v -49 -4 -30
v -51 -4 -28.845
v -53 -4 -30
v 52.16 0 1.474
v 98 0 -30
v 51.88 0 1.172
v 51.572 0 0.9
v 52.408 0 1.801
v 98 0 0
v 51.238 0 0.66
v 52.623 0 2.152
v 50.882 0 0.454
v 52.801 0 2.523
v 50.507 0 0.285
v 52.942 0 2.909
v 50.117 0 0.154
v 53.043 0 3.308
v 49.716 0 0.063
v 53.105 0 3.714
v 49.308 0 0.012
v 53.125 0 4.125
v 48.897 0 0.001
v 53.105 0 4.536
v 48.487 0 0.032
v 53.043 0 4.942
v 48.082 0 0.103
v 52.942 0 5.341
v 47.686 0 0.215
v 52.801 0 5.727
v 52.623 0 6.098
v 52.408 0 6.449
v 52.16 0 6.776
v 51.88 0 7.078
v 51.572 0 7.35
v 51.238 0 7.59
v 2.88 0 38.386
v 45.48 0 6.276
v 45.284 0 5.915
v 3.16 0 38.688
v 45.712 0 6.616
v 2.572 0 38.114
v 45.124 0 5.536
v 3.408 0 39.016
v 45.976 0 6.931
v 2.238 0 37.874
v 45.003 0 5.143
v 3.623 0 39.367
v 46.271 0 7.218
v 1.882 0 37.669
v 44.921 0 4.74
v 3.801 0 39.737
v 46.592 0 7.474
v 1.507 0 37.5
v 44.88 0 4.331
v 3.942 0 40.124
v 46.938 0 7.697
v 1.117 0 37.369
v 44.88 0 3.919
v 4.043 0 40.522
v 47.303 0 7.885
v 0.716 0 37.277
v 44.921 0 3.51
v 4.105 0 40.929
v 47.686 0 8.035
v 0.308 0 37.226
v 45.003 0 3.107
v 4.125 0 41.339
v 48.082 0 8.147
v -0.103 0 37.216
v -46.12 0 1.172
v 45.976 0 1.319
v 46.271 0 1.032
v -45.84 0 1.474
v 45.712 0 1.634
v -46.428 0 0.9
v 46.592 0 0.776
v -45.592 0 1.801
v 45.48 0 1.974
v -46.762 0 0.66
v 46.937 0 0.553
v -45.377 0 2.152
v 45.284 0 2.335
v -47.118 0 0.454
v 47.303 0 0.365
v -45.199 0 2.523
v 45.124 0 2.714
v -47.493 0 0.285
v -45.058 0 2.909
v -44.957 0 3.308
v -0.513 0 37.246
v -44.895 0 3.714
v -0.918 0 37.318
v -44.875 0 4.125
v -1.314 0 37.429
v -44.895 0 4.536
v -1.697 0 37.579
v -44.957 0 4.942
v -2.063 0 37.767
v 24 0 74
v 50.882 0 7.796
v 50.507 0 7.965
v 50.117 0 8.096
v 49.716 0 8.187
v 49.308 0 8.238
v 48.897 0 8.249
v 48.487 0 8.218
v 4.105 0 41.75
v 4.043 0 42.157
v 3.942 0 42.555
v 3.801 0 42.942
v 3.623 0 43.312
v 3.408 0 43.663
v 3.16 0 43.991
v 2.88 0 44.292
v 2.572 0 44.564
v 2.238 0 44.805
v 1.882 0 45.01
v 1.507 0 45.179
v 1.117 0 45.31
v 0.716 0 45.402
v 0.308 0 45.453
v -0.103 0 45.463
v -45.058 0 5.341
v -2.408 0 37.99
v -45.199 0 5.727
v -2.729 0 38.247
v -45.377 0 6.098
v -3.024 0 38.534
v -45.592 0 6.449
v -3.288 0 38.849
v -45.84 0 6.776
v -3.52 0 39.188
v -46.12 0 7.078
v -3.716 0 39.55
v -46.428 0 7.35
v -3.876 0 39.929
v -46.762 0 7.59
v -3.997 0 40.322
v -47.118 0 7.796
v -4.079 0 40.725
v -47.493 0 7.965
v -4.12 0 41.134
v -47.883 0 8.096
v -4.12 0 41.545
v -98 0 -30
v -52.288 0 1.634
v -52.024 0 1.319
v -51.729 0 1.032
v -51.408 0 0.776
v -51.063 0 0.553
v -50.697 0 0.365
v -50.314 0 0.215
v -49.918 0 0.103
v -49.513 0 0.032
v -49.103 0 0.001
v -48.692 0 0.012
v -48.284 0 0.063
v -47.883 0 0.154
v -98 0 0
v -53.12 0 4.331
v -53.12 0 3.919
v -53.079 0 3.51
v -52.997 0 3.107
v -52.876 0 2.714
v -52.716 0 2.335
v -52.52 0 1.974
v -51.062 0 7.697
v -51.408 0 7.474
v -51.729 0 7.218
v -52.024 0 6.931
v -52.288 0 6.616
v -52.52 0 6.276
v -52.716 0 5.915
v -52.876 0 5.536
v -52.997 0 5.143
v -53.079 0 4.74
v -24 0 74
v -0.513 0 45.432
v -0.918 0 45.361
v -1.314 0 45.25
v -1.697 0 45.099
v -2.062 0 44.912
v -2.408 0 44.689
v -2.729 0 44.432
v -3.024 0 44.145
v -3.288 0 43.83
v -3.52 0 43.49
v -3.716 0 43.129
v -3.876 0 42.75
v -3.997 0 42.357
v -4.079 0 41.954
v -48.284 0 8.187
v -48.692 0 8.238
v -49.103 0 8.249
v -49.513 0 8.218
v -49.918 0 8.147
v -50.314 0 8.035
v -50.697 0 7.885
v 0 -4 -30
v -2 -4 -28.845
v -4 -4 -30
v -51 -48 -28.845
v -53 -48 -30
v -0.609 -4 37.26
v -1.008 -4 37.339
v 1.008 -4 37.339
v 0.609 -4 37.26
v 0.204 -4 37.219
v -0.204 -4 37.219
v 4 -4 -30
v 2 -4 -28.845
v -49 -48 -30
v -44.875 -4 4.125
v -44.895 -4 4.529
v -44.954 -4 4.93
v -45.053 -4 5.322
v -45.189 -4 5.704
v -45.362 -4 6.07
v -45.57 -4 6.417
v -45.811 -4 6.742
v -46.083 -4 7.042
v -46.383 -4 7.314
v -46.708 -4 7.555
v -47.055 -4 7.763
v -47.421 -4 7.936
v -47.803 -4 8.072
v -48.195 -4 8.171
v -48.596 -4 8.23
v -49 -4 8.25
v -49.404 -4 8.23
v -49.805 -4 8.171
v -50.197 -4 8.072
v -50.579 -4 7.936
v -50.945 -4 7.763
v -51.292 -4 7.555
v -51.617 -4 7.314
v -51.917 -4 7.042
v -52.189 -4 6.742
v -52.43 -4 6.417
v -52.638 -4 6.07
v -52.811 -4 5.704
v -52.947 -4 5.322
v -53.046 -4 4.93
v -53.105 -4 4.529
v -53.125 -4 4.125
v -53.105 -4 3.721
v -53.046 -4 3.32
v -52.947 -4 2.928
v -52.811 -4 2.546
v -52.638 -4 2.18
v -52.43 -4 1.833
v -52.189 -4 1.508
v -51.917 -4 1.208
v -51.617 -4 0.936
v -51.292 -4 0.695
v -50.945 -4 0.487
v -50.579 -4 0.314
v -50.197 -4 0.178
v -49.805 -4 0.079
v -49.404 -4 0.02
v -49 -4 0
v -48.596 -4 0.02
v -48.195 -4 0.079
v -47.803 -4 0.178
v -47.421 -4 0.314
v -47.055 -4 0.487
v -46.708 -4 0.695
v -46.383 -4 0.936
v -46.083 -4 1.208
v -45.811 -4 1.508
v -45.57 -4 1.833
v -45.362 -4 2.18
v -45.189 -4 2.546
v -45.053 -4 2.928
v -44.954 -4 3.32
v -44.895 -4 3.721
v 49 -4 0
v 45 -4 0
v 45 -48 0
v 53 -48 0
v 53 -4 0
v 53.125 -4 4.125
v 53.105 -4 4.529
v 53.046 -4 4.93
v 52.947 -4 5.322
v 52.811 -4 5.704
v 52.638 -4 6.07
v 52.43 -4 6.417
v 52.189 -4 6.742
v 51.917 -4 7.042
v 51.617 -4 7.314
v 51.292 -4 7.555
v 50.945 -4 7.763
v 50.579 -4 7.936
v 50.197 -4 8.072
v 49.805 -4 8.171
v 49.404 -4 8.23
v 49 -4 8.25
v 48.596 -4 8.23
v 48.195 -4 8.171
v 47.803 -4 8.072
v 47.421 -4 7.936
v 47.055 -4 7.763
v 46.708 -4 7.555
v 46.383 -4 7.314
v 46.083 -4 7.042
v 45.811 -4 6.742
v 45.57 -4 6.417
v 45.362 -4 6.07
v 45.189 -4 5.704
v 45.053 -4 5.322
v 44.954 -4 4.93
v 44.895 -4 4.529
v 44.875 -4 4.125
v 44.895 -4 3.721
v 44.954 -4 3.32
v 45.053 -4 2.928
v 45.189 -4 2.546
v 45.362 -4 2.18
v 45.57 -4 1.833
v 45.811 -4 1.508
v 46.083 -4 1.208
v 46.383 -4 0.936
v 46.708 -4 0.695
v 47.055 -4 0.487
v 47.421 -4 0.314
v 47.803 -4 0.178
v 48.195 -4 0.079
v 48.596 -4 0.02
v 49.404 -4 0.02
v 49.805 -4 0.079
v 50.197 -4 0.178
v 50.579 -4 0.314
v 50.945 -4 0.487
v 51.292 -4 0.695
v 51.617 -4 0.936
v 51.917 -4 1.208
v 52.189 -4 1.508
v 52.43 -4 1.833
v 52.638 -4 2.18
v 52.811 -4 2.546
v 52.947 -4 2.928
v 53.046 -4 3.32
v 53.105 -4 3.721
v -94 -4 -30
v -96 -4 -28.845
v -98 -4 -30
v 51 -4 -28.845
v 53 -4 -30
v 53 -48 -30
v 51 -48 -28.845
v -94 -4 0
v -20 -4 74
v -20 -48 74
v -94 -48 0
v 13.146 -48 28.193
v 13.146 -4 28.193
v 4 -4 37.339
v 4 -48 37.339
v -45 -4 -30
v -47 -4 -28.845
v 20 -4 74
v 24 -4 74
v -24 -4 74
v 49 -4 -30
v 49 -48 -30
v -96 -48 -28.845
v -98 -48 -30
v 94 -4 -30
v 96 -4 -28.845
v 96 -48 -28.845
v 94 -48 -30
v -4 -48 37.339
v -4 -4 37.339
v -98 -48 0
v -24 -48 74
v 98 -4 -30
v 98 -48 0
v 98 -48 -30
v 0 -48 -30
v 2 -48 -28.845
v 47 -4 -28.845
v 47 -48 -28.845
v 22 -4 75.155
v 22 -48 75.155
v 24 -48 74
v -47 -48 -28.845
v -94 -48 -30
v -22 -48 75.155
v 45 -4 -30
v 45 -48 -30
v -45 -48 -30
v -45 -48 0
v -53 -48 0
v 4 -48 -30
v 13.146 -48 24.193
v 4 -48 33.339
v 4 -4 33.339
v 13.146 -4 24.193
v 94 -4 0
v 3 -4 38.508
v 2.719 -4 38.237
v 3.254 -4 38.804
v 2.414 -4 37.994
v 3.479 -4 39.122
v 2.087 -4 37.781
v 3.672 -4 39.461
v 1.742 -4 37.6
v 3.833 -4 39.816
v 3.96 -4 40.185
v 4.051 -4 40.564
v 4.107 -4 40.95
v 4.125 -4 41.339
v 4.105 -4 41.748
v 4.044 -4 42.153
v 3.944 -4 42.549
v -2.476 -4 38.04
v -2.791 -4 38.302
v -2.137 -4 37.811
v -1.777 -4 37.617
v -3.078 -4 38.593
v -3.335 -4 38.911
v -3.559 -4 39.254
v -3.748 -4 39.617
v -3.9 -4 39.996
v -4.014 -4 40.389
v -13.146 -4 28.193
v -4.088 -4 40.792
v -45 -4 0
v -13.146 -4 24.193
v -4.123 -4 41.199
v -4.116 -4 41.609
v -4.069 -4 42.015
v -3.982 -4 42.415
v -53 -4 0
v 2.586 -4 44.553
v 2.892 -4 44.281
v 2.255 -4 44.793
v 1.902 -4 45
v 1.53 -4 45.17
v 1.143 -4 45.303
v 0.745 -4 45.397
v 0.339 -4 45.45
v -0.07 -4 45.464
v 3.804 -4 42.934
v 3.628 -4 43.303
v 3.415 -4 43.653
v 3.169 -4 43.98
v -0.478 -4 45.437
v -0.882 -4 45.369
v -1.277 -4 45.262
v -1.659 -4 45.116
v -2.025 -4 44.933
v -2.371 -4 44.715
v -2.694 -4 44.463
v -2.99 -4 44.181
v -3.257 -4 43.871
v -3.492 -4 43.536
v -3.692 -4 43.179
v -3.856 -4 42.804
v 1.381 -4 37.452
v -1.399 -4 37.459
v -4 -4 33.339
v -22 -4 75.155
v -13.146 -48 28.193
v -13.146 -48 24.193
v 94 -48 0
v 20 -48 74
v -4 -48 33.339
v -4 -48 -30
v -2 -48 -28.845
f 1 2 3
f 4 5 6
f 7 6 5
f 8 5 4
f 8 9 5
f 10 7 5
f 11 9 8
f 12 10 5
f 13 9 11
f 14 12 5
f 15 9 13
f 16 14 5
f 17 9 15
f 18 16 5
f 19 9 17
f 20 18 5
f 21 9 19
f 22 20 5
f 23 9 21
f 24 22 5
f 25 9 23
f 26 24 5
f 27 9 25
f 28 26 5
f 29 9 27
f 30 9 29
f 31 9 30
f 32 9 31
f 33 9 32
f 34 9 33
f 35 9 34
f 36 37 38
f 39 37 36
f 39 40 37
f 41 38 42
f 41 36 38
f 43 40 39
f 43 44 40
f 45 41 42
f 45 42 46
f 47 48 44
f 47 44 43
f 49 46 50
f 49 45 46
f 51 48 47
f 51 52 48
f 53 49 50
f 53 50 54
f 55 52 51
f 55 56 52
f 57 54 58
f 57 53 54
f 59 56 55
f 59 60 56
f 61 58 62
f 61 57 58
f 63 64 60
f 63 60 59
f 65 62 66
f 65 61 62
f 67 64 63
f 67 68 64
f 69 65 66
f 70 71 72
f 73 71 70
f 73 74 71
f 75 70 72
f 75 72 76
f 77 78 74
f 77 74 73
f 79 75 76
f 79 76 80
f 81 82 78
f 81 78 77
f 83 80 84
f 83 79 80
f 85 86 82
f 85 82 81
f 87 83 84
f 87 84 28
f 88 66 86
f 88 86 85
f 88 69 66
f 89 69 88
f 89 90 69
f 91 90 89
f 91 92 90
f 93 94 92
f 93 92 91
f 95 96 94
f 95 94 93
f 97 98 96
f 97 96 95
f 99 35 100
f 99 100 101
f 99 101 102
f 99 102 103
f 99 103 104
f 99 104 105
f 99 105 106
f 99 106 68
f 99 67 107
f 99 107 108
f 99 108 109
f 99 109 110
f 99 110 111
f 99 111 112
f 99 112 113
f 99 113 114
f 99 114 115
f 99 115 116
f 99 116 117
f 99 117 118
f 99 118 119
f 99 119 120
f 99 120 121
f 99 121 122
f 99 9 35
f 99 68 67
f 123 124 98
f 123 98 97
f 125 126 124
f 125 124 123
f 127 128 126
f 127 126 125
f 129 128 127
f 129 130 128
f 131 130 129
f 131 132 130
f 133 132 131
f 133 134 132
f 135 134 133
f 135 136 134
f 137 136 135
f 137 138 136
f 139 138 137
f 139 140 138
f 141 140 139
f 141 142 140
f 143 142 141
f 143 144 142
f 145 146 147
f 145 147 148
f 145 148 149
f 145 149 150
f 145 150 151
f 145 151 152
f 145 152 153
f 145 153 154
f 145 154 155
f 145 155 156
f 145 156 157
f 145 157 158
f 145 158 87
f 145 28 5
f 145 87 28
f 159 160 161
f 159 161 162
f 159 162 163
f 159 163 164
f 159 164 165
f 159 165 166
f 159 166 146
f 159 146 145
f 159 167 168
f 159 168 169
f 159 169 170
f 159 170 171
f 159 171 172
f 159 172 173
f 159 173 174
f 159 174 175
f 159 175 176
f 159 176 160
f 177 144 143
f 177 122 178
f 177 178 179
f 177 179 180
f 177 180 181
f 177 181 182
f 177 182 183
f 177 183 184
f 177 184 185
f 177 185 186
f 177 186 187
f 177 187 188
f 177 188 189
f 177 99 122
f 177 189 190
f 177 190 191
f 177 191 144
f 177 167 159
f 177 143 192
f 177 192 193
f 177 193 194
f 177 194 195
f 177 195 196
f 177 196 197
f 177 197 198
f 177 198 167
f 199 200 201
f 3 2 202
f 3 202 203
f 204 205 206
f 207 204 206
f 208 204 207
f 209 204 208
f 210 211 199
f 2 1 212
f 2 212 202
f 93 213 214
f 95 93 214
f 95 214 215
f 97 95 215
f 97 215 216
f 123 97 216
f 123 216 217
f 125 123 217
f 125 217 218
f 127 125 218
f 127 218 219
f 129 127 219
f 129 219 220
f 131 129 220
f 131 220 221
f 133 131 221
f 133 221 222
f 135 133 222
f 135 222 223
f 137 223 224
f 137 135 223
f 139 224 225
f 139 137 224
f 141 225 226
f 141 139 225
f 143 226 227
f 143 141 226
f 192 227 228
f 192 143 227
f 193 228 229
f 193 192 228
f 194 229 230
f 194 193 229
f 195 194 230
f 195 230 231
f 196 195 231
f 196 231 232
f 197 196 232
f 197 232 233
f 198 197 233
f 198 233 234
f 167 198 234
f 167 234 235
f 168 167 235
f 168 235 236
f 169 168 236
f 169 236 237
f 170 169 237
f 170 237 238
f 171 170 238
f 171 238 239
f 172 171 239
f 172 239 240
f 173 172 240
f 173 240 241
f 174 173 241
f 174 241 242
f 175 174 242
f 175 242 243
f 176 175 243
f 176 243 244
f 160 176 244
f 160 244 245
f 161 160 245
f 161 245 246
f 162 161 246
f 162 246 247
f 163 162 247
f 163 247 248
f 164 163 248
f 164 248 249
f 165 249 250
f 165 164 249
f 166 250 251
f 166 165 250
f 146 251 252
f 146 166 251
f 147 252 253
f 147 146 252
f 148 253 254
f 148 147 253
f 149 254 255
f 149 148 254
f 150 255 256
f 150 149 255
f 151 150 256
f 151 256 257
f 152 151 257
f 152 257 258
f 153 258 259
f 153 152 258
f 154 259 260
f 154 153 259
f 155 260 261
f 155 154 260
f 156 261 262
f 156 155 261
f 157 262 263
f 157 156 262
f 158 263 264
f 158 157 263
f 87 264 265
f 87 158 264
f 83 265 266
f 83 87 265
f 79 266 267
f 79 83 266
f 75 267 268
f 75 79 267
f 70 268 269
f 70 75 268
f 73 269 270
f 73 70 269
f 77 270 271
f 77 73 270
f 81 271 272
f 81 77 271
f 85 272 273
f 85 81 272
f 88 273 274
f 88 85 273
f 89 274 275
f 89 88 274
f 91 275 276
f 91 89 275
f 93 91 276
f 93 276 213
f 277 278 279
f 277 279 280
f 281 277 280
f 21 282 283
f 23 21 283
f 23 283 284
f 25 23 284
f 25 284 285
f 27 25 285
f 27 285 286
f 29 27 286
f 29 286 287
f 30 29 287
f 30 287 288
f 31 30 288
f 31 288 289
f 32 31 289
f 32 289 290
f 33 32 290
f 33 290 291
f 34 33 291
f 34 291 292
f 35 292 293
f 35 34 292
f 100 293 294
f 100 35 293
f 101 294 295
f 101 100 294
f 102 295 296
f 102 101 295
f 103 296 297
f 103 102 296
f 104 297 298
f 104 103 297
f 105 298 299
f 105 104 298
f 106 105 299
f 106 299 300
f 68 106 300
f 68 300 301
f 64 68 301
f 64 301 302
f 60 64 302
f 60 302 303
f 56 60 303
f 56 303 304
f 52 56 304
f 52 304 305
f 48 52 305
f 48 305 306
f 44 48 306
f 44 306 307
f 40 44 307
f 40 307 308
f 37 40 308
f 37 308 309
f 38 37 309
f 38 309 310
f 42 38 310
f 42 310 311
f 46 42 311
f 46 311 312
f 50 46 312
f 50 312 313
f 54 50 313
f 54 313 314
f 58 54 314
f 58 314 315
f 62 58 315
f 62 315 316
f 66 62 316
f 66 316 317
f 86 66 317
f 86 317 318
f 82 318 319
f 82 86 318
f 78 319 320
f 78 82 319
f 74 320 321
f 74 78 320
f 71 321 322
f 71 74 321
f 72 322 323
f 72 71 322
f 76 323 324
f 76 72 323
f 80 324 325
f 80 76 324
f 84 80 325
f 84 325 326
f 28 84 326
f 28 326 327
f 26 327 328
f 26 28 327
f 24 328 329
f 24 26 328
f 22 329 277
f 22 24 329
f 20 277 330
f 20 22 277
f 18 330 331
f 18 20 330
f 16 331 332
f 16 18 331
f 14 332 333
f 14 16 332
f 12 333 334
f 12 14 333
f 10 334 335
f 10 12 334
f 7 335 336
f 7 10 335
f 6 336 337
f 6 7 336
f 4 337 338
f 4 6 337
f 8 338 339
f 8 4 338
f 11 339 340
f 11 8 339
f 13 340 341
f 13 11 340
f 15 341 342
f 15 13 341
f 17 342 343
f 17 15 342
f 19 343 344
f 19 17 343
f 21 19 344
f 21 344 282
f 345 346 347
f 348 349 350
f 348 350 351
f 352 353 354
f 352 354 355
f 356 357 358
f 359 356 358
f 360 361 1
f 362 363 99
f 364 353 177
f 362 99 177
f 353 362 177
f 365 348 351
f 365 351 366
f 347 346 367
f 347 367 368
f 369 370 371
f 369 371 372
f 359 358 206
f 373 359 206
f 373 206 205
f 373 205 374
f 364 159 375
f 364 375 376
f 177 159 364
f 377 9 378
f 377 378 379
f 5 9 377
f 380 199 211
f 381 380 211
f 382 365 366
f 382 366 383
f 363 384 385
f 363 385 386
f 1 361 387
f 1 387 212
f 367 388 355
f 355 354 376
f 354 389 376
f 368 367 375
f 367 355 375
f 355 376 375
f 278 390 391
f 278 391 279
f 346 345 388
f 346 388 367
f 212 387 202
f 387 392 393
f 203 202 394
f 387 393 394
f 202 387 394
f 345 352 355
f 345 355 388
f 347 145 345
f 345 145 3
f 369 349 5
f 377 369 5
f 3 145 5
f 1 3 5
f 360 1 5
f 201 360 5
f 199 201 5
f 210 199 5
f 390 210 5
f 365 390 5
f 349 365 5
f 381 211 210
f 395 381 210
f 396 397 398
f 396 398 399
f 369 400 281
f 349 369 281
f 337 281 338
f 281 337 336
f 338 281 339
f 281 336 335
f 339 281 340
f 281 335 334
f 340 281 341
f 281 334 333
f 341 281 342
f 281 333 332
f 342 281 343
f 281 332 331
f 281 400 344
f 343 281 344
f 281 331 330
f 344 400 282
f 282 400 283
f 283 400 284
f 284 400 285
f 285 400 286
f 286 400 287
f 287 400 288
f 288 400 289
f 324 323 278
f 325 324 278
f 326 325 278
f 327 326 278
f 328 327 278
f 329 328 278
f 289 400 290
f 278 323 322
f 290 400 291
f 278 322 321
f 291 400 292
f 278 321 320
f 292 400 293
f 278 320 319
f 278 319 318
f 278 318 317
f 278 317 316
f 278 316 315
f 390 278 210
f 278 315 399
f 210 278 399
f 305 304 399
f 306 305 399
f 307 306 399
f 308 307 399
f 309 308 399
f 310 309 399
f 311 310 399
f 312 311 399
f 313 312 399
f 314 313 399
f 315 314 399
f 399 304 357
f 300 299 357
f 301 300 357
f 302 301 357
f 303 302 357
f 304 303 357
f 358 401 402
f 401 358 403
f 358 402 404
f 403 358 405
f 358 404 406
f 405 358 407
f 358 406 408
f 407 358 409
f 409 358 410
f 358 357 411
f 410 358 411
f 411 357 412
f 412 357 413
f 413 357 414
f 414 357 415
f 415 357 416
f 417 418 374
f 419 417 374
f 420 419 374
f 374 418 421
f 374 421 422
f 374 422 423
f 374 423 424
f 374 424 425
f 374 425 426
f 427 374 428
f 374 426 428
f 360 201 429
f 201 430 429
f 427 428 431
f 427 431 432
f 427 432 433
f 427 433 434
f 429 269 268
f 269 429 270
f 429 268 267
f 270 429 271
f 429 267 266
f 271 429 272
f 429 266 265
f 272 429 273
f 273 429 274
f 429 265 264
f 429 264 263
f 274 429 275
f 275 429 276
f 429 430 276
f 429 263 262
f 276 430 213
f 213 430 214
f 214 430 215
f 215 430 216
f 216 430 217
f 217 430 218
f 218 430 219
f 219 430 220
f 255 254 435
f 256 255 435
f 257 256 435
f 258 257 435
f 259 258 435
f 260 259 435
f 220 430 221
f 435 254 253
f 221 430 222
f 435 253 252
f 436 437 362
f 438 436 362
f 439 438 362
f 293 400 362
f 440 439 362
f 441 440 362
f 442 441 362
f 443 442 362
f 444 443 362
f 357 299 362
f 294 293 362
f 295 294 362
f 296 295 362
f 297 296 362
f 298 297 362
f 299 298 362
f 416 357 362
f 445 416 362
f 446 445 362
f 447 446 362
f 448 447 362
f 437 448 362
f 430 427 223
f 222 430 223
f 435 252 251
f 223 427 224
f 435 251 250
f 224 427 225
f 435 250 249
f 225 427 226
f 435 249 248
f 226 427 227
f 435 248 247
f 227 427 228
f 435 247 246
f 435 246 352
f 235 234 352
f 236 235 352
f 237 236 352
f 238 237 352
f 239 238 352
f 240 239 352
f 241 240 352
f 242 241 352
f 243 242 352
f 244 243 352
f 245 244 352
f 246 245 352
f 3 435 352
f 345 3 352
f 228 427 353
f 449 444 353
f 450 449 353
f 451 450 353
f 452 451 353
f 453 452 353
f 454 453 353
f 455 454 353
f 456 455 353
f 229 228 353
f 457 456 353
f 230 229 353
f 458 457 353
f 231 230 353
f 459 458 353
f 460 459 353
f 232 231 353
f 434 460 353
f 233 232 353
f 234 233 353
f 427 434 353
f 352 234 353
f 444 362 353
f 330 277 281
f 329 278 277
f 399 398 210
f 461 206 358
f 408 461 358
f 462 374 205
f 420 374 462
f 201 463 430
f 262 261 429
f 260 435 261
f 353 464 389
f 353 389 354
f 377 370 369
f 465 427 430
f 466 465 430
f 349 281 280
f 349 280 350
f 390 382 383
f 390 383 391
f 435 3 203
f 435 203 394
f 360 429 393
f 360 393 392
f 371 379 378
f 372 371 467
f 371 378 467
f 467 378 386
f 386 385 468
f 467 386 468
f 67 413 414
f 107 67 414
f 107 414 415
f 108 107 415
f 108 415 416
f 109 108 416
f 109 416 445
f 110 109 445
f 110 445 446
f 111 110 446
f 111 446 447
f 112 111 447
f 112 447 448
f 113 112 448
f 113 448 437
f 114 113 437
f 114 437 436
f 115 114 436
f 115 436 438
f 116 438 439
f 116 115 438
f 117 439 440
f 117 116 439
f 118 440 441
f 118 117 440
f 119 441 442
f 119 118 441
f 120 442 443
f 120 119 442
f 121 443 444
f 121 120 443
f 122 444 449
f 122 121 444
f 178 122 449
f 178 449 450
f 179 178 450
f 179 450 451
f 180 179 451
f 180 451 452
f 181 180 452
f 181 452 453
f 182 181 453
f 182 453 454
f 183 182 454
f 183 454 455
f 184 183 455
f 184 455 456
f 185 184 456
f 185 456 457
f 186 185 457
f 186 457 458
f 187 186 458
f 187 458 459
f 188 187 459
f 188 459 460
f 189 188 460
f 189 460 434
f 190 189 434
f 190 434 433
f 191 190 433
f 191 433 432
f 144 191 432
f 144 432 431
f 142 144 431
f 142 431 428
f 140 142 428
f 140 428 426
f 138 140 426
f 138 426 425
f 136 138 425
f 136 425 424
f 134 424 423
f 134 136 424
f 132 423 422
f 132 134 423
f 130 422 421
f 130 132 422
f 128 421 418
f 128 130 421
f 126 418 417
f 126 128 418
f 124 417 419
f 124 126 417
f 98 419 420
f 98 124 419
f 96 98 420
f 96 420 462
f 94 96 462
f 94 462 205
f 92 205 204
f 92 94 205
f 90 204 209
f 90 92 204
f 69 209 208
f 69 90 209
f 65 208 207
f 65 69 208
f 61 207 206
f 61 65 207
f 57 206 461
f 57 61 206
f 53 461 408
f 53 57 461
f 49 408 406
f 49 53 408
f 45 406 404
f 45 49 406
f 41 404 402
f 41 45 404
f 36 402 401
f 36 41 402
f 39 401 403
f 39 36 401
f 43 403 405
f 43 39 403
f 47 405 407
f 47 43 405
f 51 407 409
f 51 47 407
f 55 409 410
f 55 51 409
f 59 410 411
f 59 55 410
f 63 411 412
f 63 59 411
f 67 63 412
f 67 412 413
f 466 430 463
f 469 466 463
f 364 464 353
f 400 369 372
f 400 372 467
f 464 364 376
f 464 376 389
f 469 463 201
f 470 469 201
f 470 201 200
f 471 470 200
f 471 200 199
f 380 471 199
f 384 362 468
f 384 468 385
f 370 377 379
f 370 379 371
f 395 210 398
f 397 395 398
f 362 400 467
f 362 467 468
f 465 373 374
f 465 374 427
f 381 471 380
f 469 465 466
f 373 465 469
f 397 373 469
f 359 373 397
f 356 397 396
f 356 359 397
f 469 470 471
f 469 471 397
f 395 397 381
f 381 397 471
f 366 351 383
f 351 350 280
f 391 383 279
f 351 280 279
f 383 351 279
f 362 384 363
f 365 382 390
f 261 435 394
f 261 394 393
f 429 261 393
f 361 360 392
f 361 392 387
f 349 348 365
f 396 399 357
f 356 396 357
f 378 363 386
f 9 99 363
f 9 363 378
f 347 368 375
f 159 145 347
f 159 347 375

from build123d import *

# Parameters (mm, degrees)
SKETCH005_R      = 4.125
EXTRUDE007_DEPTH = 4
EXTRUDE004_DEPTH = 44


with BuildPart() as extrude007:
    # Sketch005 → Extrude007 (new body)
    with BuildSketch(Plane.XZ):
        Polygon((24, 74), (98, 0), (98, -30), (94, -30), (53, -30), (49, -30), (45, -30), (4, -30), (0, -30), (-4, -30), (-45, -30), (-49, -30), (-53, -30), (-94, -30), (-98, -30), (-98, 0), (-24, 74), (-20, 74), (20, 74), align=None)
        with Locations((-49, 4.125)):
            Circle(SKETCH005_R, mode=Mode.SUBTRACT)
        with Locations((49, 4.125)):
            Circle(SKETCH005_R, mode=Mode.SUBTRACT)
        with Locations((0, 41.339394)):
            Circle(SKETCH005_R, mode=Mode.SUBTRACT)
    extrude(amount=EXTRUDE007_DEPTH)


with BuildPart() as stage_3_paths:
    # Sketch → Extrude004 (new body)
    with BuildSketch(Plane.XZ):
        Polygon((-20, 74), (-94, 0), (-94, -30), (-96, -28.845299), (-98, -30), (-98, 0), (-24, 74), (-22, 75.154701), align=None)
        Polygon((24, 74), (98, 0), (98, -30), (96, -28.845299), (94, -30), (94, 0), (20, 74), (22, 75.154701), align=None)
        Polygon((4, 37.339394), (-4, 37.339394), (-13.145979, 28.193415), (-13.145979, 24.193415), (-4, 33.339394), (-4, 0), (-4, -30), (-2, -28.845299), (0, -30), (2, -28.845299), (4, -30), (4, 0), (4, 33.339394), (13.145979, 24.193415), (13.145979, 28.193415), align=None)
        Polygon((-53, 0), (-45, 0), (-45, -30), (-47, -28.845299), (-49, -30), (-51, -28.845299), (-53, -30), align=None)
        Polygon((45, 0), (53, 0), (53, -30), (51, -28.845299), (49, -30), (47, -28.845299), (45, -30), align=None)
    extrude(amount=EXTRUDE004_DEPTH)


with BuildPart() as stage_3_paths_1:
    # Extrude004 placement: moved
    add(stage_3_paths.part.moved(Location((0, -4, 0))))

    # Fusion005: union Extrude007
    add(extrude007.part)


solid = stage_3_paths_1.part
